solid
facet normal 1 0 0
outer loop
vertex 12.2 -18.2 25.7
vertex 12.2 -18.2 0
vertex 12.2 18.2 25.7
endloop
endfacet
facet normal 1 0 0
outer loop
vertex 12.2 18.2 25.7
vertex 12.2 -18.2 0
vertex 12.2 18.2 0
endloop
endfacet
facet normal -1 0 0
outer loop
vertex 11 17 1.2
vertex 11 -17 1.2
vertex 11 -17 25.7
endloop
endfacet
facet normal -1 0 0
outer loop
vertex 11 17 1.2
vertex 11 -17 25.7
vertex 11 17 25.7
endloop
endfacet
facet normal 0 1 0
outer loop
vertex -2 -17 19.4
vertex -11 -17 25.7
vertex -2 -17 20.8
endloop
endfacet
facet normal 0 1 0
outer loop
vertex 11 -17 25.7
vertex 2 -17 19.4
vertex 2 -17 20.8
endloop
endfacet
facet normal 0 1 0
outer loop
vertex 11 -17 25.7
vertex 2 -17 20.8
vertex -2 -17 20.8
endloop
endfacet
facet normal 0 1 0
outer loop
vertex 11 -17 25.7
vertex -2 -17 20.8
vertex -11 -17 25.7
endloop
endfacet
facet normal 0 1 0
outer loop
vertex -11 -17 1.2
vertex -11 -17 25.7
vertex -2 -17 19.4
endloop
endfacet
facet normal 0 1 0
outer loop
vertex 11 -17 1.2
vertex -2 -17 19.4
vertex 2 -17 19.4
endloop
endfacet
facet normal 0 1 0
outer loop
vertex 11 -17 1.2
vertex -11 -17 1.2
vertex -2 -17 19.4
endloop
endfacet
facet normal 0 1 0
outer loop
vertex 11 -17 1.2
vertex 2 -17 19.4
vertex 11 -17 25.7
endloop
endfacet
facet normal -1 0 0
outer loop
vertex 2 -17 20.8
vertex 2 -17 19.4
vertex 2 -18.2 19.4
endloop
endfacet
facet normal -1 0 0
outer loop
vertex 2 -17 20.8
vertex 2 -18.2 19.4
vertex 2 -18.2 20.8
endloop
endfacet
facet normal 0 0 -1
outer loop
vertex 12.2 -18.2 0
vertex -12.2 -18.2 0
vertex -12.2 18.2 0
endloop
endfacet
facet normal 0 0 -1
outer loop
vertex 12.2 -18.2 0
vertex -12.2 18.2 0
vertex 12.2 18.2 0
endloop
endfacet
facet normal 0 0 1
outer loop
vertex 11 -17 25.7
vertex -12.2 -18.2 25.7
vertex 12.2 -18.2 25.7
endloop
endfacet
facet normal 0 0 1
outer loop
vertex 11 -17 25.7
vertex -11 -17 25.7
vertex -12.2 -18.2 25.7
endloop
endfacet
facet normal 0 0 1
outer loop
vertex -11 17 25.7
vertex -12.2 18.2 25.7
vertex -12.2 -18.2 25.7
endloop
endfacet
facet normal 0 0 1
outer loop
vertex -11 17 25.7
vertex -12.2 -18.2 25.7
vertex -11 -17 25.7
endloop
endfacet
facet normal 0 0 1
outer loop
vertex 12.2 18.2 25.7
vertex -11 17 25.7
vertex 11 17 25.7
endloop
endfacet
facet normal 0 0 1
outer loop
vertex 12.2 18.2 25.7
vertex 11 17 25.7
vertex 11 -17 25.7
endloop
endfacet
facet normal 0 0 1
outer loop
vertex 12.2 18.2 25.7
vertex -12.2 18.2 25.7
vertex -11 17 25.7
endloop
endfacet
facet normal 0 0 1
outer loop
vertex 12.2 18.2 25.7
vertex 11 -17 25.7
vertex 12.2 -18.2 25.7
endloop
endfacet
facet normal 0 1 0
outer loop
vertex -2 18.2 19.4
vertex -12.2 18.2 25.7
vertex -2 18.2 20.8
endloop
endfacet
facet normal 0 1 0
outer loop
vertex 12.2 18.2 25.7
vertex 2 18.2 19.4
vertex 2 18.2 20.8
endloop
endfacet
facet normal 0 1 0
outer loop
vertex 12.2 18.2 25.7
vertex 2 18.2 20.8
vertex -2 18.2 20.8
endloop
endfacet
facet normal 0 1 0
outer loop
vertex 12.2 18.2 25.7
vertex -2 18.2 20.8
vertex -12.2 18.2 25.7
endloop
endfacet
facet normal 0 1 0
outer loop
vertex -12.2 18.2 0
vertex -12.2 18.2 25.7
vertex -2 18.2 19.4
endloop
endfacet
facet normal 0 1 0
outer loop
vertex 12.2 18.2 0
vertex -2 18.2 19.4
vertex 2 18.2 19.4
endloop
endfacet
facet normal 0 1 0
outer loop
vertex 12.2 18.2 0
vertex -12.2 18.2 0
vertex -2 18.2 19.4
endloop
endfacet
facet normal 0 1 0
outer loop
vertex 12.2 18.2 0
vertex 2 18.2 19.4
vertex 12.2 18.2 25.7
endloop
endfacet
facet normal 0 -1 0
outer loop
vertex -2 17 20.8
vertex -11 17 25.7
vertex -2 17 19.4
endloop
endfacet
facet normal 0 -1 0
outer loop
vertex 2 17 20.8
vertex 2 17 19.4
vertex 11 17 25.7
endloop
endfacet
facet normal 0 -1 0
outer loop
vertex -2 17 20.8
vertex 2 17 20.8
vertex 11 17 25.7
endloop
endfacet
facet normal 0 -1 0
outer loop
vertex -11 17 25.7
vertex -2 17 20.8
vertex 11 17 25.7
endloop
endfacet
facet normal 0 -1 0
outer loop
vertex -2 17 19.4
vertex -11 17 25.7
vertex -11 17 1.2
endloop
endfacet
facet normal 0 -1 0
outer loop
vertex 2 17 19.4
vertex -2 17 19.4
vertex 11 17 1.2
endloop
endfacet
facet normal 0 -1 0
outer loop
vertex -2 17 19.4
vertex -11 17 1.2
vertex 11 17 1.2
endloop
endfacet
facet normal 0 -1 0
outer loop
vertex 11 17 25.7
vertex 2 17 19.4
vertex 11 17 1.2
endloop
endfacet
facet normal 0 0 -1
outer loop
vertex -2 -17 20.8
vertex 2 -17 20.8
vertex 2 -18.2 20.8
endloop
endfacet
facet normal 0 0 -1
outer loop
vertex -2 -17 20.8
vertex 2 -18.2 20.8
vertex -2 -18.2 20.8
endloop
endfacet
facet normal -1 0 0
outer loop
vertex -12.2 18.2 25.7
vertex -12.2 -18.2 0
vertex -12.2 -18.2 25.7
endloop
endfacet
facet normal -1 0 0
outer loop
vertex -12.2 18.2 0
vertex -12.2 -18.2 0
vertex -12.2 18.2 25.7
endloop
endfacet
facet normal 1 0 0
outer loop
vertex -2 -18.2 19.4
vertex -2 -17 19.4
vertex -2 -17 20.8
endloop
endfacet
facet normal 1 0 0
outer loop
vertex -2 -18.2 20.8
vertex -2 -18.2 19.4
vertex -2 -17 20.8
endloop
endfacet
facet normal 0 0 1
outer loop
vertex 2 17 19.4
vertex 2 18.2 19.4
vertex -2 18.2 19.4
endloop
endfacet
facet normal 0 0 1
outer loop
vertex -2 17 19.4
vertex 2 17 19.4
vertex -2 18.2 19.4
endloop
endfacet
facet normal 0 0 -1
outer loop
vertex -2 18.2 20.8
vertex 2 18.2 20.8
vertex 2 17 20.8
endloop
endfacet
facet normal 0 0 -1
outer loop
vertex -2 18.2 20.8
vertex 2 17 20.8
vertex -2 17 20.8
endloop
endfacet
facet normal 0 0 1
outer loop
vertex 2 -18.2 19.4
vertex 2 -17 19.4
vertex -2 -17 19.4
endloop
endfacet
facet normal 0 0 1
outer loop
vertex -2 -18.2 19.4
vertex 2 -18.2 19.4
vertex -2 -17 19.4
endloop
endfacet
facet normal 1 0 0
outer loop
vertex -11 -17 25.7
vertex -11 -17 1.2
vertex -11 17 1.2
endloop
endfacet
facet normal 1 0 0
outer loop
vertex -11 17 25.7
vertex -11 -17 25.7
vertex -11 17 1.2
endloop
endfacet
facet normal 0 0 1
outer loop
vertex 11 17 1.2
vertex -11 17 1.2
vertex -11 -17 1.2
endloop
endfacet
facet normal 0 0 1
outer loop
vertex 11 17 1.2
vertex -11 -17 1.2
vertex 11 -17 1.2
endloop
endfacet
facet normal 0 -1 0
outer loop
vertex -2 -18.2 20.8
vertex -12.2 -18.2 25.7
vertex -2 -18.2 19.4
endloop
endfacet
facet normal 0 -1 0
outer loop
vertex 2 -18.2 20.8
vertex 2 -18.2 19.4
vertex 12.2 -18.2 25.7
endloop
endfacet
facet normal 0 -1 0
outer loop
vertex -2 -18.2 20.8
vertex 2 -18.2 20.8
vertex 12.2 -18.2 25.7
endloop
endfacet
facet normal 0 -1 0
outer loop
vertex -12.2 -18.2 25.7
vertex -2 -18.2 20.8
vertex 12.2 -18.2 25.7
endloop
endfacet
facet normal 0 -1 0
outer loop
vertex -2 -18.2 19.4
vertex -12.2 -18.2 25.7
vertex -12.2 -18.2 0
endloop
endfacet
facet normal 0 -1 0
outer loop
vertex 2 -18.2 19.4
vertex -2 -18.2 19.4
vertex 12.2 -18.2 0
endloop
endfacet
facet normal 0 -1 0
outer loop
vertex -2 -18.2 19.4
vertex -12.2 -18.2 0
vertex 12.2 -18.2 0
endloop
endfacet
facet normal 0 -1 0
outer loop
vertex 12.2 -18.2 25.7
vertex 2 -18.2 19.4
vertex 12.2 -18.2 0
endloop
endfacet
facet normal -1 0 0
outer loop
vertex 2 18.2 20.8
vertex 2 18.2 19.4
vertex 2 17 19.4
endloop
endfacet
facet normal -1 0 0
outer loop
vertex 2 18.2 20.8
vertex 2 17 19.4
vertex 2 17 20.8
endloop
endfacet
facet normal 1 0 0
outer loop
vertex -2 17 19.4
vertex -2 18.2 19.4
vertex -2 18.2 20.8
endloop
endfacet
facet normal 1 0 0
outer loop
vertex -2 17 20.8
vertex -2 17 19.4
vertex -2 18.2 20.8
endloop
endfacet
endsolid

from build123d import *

# Parameters (mm, degrees)
F0_W     = 22
F0_H     = 34
F1_DEPTH = 1.2
F0_W_2   = 24.4
F0_H_2   = 36.4
F2_DEPTH = 25.7
F3_W     = 4
F3_H     = 1.4
F4_DEPTH = 36.401


with BuildPart() as f1:
    # F0 (on Top) → F1 (new body)
    with BuildSketch(Plane.XY):
        Rectangle(F0_W, F0_H)
    extrude(amount=F1_DEPTH)

    # F0 (on Top) → F2 (join)
    with BuildSketch(Plane.XY):
        Rectangle(F0_W_2, F0_H_2)
        Rectangle(F0_W, F0_H, mode=Mode.SUBTRACT)
    extrude(amount=F2_DEPTH)

    # F3 (on face) → F4 (cut, through all)
    with BuildSketch(Plane(origin=(0, 18.2, 0), x_dir=(-1, 0, 0), z_dir=(0, 1, 0))):
        with Locations((0, 20.1)):
            Rectangle(F3_W, F3_H)
    extrude(amount=-F4_DEPTH, mode=Mode.SUBTRACT)


solid = f1.part
